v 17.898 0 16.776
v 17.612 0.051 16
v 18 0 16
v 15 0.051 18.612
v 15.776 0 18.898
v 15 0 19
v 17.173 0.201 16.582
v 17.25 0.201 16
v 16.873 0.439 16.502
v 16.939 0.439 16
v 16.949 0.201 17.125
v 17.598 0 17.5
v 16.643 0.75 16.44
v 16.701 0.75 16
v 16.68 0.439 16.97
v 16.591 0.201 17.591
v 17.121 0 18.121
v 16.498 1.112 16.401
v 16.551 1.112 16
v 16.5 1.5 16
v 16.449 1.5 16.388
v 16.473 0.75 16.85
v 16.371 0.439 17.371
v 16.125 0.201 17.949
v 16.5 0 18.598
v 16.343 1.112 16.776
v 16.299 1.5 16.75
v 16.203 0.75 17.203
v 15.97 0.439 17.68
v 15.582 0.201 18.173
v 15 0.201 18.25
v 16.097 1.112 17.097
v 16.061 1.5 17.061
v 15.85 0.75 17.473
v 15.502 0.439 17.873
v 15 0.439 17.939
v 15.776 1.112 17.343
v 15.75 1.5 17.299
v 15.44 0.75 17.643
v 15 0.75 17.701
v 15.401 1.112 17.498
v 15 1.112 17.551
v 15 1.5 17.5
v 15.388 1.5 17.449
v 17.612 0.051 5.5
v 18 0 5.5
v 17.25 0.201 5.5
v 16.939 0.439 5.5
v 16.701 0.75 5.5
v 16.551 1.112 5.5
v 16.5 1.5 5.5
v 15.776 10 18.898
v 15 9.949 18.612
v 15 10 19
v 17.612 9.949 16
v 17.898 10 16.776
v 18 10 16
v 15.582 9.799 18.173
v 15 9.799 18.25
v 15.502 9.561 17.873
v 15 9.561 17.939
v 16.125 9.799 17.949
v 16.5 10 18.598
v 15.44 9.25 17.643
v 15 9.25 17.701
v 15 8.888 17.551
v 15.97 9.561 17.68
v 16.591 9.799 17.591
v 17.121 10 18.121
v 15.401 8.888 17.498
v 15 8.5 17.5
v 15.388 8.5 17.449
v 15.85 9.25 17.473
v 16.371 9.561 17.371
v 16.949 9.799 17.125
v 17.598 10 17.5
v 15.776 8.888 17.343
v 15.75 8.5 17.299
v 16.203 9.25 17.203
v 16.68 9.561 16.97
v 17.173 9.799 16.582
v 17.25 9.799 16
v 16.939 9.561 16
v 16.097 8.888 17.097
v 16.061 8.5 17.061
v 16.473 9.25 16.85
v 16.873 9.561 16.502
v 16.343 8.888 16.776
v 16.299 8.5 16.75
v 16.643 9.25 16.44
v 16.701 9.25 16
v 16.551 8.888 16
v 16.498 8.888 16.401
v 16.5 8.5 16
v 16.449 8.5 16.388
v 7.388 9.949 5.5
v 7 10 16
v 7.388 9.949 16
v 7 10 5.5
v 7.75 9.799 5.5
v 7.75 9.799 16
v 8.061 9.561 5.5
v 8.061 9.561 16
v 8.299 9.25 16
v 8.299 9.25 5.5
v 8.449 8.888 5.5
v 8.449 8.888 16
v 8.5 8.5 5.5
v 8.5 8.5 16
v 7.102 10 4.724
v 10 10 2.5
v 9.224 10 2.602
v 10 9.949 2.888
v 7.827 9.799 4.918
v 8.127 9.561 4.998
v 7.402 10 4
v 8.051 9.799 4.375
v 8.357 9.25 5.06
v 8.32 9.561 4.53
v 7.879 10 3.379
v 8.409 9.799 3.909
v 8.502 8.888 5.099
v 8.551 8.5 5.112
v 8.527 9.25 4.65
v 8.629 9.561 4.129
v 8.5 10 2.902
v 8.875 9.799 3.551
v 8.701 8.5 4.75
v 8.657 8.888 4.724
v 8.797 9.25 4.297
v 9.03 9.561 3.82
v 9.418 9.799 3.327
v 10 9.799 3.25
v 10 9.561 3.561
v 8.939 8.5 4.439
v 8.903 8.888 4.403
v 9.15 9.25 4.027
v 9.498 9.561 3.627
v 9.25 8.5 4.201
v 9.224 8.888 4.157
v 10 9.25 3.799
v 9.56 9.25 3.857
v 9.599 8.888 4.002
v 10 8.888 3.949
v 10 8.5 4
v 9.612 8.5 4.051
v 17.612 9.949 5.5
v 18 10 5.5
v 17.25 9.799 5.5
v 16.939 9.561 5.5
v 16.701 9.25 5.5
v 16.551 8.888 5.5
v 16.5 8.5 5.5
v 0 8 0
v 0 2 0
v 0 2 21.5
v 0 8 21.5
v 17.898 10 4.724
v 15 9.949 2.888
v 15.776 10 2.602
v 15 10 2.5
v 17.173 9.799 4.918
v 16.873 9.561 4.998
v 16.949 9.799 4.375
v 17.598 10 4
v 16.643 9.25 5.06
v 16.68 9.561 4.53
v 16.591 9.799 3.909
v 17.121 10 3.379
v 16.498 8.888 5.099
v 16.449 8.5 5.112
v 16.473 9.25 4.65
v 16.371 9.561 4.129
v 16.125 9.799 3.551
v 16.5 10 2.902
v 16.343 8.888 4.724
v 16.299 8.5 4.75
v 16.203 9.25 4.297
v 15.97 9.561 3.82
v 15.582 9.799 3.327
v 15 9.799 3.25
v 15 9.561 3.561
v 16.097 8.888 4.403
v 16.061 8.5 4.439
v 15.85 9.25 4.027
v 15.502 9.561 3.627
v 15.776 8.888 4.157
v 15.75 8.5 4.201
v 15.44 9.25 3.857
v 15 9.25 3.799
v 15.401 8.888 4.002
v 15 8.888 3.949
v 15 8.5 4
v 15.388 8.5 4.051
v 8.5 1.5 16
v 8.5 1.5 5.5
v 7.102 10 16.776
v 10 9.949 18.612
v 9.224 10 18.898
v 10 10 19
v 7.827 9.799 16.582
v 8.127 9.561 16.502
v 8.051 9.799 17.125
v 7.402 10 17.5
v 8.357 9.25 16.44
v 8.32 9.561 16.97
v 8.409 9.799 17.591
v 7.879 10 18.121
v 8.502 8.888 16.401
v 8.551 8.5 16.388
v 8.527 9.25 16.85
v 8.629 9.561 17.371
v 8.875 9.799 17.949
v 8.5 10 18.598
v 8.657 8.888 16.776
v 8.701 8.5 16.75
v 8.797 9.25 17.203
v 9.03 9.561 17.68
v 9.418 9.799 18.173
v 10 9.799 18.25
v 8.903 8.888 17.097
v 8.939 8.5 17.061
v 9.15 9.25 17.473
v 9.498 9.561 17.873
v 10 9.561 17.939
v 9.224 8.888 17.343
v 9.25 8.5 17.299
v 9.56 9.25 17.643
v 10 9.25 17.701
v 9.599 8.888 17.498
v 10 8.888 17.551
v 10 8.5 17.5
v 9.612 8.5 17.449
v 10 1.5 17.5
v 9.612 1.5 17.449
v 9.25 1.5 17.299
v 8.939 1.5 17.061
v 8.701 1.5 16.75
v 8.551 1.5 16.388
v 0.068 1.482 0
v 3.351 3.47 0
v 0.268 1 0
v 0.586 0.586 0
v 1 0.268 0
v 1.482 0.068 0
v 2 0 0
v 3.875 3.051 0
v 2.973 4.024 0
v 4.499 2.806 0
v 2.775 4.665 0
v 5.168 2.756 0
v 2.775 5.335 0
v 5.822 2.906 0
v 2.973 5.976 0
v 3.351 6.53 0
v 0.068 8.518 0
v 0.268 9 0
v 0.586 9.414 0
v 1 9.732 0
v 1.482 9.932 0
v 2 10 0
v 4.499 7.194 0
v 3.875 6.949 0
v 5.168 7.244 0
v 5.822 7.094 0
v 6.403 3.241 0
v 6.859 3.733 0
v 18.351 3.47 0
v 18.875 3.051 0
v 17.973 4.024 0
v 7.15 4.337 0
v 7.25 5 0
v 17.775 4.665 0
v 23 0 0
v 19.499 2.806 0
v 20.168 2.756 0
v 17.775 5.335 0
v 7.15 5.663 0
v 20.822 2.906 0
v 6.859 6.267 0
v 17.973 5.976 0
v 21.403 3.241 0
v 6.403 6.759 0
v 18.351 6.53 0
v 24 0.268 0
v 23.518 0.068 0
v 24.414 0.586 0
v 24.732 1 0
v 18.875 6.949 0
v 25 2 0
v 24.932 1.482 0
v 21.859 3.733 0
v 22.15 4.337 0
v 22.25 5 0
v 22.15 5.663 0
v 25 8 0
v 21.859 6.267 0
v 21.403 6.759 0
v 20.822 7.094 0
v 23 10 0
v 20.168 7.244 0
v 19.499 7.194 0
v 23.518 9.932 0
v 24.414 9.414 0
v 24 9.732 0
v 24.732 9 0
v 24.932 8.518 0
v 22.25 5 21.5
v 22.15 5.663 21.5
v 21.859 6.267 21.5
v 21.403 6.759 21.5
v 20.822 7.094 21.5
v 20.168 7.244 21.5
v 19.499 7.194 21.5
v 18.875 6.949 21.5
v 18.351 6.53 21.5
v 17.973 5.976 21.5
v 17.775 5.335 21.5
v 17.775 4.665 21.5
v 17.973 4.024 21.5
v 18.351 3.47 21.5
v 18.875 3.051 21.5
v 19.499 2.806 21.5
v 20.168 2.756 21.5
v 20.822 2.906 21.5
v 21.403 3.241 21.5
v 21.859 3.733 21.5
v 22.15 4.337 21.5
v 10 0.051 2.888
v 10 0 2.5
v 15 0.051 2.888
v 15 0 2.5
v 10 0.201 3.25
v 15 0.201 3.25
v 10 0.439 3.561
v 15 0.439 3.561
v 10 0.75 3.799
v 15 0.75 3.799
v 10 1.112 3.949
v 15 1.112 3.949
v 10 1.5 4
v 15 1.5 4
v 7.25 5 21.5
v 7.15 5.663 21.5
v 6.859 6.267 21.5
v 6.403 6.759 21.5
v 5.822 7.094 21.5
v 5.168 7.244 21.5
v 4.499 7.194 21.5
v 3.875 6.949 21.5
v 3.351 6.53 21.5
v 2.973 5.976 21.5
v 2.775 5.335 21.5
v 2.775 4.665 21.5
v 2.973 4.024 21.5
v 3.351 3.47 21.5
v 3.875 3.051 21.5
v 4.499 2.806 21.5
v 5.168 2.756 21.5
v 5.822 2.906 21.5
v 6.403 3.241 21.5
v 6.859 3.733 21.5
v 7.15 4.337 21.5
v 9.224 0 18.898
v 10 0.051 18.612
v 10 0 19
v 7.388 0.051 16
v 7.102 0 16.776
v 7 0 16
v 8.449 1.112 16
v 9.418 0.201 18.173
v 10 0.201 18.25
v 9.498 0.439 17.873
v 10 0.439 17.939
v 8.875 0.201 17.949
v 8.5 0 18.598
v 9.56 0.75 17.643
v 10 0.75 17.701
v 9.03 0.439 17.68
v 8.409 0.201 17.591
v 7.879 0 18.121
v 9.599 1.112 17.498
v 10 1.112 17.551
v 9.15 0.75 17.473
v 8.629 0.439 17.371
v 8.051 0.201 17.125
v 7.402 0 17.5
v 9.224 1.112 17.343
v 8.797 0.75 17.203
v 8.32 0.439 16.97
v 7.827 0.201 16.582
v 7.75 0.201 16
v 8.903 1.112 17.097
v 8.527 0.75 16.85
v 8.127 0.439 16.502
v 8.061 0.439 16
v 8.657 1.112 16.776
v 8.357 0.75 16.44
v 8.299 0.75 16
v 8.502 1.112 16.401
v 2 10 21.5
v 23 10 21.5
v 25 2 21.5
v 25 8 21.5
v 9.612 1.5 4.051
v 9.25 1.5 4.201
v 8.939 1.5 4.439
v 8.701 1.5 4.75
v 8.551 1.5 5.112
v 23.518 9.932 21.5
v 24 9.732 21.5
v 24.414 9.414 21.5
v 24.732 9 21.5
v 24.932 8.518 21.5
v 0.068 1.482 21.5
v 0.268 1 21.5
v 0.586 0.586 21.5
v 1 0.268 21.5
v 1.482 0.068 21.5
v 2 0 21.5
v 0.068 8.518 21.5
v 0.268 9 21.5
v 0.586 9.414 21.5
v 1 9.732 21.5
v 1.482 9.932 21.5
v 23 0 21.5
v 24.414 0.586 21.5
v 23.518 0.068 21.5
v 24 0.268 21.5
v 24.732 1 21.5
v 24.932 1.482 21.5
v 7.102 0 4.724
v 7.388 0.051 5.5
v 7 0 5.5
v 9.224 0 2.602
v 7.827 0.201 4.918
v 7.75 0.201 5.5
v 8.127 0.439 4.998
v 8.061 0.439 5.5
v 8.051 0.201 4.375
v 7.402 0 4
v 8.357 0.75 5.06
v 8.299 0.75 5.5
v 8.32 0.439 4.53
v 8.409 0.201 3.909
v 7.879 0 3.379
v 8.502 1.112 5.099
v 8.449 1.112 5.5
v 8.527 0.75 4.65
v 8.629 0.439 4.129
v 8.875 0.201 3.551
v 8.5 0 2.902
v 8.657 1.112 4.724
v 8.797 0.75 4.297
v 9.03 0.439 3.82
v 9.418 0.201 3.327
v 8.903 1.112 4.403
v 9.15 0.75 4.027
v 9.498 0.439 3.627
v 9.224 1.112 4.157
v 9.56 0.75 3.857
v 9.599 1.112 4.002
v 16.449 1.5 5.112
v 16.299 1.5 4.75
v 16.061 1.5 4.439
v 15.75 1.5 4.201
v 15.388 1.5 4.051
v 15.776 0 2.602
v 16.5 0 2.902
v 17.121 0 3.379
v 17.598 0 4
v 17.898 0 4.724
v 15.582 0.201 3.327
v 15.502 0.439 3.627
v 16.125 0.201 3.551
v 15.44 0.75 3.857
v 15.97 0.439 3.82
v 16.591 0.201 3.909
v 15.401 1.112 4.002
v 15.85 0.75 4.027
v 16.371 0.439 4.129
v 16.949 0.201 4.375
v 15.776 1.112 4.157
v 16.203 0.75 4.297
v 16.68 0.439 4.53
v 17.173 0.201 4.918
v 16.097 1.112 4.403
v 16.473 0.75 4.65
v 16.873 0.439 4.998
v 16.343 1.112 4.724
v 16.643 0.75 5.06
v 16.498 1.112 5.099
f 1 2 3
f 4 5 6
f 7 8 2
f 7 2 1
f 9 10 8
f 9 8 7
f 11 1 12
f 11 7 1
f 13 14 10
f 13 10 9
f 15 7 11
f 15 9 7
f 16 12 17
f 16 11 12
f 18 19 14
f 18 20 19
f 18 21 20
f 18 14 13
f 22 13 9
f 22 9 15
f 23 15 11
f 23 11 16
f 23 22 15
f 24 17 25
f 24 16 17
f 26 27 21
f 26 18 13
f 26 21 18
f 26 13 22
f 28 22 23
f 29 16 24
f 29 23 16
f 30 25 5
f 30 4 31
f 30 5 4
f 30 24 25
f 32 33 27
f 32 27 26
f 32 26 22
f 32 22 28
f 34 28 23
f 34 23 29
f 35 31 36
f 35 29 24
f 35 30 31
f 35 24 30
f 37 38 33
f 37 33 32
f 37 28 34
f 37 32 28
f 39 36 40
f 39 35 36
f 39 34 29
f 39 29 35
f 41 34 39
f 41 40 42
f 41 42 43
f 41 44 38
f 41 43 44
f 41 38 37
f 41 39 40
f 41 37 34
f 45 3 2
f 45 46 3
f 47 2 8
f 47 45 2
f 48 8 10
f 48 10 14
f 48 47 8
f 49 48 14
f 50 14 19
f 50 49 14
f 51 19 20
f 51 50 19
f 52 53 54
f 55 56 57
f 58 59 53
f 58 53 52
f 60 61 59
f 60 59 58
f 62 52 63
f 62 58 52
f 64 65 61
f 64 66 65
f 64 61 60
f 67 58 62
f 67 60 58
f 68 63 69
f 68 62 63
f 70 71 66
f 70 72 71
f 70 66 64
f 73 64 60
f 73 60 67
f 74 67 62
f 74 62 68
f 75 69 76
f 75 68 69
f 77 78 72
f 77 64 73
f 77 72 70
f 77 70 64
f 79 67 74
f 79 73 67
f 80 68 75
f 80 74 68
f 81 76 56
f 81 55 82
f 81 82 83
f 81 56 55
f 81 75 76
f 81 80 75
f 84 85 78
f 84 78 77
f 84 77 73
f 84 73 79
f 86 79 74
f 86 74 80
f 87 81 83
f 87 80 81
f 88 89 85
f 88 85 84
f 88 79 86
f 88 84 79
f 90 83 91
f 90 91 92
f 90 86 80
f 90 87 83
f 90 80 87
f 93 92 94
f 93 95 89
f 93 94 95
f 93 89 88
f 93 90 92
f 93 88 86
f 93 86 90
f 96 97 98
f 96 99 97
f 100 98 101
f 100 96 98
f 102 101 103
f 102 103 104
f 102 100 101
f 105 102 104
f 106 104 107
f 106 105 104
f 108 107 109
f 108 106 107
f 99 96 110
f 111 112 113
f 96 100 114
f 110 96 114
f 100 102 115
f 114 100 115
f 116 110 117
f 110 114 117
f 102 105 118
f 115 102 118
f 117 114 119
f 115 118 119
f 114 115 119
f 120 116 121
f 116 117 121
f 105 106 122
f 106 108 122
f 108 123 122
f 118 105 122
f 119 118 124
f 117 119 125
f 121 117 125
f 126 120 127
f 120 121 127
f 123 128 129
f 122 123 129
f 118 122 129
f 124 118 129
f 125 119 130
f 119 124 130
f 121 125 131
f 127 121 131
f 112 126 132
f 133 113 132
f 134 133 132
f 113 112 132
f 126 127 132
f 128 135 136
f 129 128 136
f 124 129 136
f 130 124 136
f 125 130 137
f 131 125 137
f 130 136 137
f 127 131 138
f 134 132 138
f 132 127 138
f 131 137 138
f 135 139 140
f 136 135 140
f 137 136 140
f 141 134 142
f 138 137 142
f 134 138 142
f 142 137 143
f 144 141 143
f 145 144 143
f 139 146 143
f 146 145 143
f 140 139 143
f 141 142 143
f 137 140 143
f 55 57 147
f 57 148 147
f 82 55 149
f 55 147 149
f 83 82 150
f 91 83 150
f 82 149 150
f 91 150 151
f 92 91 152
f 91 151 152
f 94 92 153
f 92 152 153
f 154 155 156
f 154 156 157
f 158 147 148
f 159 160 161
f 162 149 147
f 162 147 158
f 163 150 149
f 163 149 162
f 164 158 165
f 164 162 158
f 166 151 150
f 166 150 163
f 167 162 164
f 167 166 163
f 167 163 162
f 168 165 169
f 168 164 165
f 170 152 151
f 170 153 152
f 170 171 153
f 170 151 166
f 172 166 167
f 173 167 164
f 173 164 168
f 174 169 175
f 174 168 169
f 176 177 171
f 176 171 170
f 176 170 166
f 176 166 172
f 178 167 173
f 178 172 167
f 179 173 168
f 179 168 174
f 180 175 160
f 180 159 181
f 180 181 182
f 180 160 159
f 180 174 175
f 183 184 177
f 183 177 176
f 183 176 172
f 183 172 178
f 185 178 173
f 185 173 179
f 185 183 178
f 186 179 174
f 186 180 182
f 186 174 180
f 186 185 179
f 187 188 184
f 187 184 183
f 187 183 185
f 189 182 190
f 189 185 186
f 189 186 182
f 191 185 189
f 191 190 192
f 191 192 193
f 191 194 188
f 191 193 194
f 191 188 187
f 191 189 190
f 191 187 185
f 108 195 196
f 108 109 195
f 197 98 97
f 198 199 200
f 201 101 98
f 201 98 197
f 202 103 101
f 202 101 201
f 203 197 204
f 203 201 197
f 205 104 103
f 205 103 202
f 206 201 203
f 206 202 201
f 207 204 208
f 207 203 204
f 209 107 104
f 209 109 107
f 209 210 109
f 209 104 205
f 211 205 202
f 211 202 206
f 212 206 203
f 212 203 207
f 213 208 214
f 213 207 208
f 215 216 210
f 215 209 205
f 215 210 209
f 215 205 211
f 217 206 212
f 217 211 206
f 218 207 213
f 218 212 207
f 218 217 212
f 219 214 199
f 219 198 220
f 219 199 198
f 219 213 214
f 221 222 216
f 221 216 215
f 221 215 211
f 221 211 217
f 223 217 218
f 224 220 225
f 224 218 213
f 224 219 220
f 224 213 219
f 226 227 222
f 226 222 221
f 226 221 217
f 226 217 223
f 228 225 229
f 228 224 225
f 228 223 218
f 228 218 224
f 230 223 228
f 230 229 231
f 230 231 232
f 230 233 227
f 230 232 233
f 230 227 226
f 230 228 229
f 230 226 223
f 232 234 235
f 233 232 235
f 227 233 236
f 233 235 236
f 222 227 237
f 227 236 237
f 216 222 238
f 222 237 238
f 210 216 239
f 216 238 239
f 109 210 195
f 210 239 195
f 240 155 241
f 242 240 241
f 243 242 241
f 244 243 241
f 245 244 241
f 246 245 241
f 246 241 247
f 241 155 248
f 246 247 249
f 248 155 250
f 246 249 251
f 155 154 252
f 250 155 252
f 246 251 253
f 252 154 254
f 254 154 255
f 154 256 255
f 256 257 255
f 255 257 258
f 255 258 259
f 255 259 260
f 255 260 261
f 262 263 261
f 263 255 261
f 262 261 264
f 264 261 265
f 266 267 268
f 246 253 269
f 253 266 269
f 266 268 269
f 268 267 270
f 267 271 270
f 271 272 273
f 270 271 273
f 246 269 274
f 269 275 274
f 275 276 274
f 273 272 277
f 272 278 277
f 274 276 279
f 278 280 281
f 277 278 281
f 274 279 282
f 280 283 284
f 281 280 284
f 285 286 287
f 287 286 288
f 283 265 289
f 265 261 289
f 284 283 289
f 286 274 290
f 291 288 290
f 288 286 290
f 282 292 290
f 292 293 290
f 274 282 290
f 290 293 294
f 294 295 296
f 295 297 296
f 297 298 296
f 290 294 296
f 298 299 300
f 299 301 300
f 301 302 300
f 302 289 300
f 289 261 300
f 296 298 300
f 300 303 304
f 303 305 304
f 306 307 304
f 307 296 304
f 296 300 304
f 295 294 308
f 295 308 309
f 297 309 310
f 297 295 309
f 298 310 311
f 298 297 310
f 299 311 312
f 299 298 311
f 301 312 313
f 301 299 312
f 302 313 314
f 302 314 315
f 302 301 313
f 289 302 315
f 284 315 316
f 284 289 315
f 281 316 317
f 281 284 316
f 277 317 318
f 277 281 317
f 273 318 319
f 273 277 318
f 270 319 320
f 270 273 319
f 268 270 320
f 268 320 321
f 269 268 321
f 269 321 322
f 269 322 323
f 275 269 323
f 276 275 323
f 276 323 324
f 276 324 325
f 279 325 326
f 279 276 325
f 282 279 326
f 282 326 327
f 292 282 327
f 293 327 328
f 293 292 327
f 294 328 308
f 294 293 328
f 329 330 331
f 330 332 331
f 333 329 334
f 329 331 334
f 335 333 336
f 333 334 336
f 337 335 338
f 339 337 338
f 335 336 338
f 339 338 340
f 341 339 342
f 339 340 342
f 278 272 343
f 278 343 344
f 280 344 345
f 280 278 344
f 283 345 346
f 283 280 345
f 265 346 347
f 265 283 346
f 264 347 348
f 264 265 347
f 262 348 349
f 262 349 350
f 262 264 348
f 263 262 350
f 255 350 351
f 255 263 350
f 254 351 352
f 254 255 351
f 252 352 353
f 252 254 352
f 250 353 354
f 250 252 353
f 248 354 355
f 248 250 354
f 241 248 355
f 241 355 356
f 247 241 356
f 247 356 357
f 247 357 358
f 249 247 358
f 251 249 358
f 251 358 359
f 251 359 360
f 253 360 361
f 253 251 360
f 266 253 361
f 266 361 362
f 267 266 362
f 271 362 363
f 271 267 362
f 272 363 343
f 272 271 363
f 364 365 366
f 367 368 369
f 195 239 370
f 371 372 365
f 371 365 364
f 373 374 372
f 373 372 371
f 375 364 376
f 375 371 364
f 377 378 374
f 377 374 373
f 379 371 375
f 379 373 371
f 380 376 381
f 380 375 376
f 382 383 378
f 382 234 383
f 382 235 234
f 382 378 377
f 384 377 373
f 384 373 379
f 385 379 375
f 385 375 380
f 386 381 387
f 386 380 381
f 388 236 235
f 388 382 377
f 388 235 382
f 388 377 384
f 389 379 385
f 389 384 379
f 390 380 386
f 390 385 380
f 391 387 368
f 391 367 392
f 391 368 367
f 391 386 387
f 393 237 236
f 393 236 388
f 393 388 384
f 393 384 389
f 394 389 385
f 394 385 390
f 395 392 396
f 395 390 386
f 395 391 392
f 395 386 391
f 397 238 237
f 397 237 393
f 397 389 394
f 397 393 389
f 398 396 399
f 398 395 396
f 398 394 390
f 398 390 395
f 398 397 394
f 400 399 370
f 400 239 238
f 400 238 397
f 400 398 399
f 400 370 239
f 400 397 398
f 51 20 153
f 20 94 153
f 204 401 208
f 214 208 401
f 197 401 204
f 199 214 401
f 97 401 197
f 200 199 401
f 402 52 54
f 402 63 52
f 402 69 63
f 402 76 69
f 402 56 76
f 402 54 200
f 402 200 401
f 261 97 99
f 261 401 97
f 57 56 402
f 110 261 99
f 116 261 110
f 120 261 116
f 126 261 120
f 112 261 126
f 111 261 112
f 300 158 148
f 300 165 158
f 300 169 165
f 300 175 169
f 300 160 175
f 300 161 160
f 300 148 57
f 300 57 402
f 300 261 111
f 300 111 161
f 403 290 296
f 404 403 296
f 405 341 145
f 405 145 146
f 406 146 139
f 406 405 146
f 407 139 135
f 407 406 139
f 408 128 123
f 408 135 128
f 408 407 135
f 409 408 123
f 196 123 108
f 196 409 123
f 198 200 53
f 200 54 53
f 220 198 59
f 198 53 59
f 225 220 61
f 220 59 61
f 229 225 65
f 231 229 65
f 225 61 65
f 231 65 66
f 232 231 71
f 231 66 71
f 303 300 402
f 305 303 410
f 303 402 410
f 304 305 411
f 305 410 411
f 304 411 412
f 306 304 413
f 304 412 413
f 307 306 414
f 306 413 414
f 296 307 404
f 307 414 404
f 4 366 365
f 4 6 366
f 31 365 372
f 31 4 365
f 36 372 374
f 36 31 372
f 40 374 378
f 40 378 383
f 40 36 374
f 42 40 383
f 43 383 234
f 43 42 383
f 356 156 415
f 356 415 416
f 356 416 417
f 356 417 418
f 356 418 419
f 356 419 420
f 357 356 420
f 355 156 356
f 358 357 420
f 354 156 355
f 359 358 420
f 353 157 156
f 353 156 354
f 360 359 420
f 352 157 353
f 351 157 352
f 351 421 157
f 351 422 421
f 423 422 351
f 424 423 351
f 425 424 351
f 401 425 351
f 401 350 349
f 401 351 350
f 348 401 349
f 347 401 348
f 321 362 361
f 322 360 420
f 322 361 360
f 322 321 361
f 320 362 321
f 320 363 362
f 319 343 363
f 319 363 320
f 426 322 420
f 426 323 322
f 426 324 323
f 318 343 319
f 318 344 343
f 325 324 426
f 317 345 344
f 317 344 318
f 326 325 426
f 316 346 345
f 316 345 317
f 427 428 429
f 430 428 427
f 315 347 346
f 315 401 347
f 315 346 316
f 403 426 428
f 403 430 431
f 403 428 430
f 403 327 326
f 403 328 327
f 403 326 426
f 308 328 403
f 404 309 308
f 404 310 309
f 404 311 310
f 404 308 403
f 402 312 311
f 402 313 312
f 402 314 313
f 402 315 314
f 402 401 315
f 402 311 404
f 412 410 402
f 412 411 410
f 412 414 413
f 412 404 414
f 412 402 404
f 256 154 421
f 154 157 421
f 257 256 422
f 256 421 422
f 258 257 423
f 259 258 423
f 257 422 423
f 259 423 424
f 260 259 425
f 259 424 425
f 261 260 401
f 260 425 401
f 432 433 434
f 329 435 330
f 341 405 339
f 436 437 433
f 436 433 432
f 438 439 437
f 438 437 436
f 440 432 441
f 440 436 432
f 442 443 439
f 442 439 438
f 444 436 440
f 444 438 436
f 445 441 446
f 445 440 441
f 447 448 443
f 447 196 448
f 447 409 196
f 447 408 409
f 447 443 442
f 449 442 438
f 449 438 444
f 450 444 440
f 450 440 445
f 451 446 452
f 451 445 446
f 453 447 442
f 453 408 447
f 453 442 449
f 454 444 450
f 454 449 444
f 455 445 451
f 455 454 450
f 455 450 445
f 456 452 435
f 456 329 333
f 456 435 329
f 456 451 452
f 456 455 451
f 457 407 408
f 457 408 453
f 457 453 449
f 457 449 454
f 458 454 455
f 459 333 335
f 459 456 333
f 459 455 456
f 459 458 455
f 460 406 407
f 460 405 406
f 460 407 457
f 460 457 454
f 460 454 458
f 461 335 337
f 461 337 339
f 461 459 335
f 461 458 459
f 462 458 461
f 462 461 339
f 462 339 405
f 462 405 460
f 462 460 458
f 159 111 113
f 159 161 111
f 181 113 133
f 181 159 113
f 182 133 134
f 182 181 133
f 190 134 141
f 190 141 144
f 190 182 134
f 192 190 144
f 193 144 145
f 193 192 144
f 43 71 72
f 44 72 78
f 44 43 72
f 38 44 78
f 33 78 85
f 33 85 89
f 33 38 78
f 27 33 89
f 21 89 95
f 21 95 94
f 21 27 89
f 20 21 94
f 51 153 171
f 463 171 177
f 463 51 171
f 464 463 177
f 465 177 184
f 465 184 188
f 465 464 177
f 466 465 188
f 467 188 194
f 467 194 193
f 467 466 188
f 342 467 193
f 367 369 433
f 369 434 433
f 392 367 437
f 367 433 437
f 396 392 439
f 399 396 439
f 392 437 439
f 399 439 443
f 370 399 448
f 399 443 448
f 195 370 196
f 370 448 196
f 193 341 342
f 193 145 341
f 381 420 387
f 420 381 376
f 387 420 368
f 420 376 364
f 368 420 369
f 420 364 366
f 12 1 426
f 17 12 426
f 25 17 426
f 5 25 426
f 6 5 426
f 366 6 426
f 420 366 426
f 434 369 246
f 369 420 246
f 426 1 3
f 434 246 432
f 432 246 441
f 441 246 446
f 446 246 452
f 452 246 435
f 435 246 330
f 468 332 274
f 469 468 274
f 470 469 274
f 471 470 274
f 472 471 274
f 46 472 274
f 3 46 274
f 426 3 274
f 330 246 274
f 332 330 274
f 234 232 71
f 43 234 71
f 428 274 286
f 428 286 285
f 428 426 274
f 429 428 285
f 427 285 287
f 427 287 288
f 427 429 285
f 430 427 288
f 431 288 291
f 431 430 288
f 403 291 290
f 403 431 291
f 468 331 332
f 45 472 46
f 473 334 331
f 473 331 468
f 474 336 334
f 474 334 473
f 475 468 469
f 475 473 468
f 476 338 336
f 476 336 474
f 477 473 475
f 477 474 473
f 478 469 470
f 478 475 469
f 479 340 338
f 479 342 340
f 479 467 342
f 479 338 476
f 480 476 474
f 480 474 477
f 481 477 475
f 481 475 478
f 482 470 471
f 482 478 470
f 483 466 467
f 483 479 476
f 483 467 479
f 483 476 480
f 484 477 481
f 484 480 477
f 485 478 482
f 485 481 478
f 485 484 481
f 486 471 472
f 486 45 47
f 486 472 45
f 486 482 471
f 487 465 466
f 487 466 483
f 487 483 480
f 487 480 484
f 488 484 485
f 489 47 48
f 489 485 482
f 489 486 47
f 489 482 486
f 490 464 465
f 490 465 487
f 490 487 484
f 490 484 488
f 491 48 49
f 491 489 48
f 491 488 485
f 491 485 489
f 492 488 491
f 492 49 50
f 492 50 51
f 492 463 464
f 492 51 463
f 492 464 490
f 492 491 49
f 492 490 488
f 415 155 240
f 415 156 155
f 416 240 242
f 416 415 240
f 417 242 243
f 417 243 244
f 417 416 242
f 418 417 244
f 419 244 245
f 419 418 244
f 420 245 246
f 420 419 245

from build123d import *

# Parameters (mm, degrees)
SKETCH_1_W          = 25
SKETCH_1_H          = 10
SKETCH_1_R          = 2.25
EXTRUDE_1_DEPTH     = 21.5
FILLET_1_R          = 2
SKETCH_2_W          = 8
SKETCH_2_H          = 13.5
CUT_EXTRUDE_1_DEPTH = 35.456494308
FILLET_2_R          = 1.5


with BuildPart() as part:
    # 草图1 → 凸台-拉伸1 (new body)
    with BuildSketch(Plane.XY):
        with Locations((12.5, 5)):
            Rectangle(SKETCH_1_W, SKETCH_1_H)
        with Locations((5, 5)):
            Circle(SKETCH_1_R, mode=Mode.SUBTRACT)
        with Locations((20, 5)):
            Circle(SKETCH_1_R, mode=Mode.SUBTRACT)
    extrude(amount=EXTRUDE_1_DEPTH)

    # 圆角1
    fillet_1_edges = [part.edges().sort_by_distance(p)[0] for p in [
        (0, 10, 10.75),
        (25, 10, 10.75),
        (25, 0, 10.75),
        (0, 0, 10.75),
    ]]
    fillet(fillet_1_edges, radius=FILLET_1_R)

    # 草图2 → 切除-拉伸1 (cut, through all)
    with BuildSketch(Plane(origin=(0, 10, 0), x_dir=(1, 0, 0), z_dir=(0, 1, 0))):
        with Locations((12.5, -10.75)):
            Rectangle(SKETCH_2_W, SKETCH_2_H)
    extrude(amount=-CUT_EXTRUDE_1_DEPTH, mode=Mode.SUBTRACT)

    # 圆角2
    fillet_2_edges = [part.edges().sort_by_distance(p)[0] for p in [
        (8.5, 0, 10.75),
        (8.5, 5, 17.5),
        (12.5, 0, 4),
        (8.5, 5, 4),
        (16.5, 0, 10.75),
        (16.5, 5, 4),
        (12.5, 0, 17.5),
        (16.5, 5, 17.5),
        (8.5, 10, 10.75),
        (12.5, 10, 17.5),
        (16.5, 10, 10.75),
        (12.5, 10, 4),
    ]]
    fillet(fillet_2_edges, radius=FILLET_2_R)


solid = part.part
